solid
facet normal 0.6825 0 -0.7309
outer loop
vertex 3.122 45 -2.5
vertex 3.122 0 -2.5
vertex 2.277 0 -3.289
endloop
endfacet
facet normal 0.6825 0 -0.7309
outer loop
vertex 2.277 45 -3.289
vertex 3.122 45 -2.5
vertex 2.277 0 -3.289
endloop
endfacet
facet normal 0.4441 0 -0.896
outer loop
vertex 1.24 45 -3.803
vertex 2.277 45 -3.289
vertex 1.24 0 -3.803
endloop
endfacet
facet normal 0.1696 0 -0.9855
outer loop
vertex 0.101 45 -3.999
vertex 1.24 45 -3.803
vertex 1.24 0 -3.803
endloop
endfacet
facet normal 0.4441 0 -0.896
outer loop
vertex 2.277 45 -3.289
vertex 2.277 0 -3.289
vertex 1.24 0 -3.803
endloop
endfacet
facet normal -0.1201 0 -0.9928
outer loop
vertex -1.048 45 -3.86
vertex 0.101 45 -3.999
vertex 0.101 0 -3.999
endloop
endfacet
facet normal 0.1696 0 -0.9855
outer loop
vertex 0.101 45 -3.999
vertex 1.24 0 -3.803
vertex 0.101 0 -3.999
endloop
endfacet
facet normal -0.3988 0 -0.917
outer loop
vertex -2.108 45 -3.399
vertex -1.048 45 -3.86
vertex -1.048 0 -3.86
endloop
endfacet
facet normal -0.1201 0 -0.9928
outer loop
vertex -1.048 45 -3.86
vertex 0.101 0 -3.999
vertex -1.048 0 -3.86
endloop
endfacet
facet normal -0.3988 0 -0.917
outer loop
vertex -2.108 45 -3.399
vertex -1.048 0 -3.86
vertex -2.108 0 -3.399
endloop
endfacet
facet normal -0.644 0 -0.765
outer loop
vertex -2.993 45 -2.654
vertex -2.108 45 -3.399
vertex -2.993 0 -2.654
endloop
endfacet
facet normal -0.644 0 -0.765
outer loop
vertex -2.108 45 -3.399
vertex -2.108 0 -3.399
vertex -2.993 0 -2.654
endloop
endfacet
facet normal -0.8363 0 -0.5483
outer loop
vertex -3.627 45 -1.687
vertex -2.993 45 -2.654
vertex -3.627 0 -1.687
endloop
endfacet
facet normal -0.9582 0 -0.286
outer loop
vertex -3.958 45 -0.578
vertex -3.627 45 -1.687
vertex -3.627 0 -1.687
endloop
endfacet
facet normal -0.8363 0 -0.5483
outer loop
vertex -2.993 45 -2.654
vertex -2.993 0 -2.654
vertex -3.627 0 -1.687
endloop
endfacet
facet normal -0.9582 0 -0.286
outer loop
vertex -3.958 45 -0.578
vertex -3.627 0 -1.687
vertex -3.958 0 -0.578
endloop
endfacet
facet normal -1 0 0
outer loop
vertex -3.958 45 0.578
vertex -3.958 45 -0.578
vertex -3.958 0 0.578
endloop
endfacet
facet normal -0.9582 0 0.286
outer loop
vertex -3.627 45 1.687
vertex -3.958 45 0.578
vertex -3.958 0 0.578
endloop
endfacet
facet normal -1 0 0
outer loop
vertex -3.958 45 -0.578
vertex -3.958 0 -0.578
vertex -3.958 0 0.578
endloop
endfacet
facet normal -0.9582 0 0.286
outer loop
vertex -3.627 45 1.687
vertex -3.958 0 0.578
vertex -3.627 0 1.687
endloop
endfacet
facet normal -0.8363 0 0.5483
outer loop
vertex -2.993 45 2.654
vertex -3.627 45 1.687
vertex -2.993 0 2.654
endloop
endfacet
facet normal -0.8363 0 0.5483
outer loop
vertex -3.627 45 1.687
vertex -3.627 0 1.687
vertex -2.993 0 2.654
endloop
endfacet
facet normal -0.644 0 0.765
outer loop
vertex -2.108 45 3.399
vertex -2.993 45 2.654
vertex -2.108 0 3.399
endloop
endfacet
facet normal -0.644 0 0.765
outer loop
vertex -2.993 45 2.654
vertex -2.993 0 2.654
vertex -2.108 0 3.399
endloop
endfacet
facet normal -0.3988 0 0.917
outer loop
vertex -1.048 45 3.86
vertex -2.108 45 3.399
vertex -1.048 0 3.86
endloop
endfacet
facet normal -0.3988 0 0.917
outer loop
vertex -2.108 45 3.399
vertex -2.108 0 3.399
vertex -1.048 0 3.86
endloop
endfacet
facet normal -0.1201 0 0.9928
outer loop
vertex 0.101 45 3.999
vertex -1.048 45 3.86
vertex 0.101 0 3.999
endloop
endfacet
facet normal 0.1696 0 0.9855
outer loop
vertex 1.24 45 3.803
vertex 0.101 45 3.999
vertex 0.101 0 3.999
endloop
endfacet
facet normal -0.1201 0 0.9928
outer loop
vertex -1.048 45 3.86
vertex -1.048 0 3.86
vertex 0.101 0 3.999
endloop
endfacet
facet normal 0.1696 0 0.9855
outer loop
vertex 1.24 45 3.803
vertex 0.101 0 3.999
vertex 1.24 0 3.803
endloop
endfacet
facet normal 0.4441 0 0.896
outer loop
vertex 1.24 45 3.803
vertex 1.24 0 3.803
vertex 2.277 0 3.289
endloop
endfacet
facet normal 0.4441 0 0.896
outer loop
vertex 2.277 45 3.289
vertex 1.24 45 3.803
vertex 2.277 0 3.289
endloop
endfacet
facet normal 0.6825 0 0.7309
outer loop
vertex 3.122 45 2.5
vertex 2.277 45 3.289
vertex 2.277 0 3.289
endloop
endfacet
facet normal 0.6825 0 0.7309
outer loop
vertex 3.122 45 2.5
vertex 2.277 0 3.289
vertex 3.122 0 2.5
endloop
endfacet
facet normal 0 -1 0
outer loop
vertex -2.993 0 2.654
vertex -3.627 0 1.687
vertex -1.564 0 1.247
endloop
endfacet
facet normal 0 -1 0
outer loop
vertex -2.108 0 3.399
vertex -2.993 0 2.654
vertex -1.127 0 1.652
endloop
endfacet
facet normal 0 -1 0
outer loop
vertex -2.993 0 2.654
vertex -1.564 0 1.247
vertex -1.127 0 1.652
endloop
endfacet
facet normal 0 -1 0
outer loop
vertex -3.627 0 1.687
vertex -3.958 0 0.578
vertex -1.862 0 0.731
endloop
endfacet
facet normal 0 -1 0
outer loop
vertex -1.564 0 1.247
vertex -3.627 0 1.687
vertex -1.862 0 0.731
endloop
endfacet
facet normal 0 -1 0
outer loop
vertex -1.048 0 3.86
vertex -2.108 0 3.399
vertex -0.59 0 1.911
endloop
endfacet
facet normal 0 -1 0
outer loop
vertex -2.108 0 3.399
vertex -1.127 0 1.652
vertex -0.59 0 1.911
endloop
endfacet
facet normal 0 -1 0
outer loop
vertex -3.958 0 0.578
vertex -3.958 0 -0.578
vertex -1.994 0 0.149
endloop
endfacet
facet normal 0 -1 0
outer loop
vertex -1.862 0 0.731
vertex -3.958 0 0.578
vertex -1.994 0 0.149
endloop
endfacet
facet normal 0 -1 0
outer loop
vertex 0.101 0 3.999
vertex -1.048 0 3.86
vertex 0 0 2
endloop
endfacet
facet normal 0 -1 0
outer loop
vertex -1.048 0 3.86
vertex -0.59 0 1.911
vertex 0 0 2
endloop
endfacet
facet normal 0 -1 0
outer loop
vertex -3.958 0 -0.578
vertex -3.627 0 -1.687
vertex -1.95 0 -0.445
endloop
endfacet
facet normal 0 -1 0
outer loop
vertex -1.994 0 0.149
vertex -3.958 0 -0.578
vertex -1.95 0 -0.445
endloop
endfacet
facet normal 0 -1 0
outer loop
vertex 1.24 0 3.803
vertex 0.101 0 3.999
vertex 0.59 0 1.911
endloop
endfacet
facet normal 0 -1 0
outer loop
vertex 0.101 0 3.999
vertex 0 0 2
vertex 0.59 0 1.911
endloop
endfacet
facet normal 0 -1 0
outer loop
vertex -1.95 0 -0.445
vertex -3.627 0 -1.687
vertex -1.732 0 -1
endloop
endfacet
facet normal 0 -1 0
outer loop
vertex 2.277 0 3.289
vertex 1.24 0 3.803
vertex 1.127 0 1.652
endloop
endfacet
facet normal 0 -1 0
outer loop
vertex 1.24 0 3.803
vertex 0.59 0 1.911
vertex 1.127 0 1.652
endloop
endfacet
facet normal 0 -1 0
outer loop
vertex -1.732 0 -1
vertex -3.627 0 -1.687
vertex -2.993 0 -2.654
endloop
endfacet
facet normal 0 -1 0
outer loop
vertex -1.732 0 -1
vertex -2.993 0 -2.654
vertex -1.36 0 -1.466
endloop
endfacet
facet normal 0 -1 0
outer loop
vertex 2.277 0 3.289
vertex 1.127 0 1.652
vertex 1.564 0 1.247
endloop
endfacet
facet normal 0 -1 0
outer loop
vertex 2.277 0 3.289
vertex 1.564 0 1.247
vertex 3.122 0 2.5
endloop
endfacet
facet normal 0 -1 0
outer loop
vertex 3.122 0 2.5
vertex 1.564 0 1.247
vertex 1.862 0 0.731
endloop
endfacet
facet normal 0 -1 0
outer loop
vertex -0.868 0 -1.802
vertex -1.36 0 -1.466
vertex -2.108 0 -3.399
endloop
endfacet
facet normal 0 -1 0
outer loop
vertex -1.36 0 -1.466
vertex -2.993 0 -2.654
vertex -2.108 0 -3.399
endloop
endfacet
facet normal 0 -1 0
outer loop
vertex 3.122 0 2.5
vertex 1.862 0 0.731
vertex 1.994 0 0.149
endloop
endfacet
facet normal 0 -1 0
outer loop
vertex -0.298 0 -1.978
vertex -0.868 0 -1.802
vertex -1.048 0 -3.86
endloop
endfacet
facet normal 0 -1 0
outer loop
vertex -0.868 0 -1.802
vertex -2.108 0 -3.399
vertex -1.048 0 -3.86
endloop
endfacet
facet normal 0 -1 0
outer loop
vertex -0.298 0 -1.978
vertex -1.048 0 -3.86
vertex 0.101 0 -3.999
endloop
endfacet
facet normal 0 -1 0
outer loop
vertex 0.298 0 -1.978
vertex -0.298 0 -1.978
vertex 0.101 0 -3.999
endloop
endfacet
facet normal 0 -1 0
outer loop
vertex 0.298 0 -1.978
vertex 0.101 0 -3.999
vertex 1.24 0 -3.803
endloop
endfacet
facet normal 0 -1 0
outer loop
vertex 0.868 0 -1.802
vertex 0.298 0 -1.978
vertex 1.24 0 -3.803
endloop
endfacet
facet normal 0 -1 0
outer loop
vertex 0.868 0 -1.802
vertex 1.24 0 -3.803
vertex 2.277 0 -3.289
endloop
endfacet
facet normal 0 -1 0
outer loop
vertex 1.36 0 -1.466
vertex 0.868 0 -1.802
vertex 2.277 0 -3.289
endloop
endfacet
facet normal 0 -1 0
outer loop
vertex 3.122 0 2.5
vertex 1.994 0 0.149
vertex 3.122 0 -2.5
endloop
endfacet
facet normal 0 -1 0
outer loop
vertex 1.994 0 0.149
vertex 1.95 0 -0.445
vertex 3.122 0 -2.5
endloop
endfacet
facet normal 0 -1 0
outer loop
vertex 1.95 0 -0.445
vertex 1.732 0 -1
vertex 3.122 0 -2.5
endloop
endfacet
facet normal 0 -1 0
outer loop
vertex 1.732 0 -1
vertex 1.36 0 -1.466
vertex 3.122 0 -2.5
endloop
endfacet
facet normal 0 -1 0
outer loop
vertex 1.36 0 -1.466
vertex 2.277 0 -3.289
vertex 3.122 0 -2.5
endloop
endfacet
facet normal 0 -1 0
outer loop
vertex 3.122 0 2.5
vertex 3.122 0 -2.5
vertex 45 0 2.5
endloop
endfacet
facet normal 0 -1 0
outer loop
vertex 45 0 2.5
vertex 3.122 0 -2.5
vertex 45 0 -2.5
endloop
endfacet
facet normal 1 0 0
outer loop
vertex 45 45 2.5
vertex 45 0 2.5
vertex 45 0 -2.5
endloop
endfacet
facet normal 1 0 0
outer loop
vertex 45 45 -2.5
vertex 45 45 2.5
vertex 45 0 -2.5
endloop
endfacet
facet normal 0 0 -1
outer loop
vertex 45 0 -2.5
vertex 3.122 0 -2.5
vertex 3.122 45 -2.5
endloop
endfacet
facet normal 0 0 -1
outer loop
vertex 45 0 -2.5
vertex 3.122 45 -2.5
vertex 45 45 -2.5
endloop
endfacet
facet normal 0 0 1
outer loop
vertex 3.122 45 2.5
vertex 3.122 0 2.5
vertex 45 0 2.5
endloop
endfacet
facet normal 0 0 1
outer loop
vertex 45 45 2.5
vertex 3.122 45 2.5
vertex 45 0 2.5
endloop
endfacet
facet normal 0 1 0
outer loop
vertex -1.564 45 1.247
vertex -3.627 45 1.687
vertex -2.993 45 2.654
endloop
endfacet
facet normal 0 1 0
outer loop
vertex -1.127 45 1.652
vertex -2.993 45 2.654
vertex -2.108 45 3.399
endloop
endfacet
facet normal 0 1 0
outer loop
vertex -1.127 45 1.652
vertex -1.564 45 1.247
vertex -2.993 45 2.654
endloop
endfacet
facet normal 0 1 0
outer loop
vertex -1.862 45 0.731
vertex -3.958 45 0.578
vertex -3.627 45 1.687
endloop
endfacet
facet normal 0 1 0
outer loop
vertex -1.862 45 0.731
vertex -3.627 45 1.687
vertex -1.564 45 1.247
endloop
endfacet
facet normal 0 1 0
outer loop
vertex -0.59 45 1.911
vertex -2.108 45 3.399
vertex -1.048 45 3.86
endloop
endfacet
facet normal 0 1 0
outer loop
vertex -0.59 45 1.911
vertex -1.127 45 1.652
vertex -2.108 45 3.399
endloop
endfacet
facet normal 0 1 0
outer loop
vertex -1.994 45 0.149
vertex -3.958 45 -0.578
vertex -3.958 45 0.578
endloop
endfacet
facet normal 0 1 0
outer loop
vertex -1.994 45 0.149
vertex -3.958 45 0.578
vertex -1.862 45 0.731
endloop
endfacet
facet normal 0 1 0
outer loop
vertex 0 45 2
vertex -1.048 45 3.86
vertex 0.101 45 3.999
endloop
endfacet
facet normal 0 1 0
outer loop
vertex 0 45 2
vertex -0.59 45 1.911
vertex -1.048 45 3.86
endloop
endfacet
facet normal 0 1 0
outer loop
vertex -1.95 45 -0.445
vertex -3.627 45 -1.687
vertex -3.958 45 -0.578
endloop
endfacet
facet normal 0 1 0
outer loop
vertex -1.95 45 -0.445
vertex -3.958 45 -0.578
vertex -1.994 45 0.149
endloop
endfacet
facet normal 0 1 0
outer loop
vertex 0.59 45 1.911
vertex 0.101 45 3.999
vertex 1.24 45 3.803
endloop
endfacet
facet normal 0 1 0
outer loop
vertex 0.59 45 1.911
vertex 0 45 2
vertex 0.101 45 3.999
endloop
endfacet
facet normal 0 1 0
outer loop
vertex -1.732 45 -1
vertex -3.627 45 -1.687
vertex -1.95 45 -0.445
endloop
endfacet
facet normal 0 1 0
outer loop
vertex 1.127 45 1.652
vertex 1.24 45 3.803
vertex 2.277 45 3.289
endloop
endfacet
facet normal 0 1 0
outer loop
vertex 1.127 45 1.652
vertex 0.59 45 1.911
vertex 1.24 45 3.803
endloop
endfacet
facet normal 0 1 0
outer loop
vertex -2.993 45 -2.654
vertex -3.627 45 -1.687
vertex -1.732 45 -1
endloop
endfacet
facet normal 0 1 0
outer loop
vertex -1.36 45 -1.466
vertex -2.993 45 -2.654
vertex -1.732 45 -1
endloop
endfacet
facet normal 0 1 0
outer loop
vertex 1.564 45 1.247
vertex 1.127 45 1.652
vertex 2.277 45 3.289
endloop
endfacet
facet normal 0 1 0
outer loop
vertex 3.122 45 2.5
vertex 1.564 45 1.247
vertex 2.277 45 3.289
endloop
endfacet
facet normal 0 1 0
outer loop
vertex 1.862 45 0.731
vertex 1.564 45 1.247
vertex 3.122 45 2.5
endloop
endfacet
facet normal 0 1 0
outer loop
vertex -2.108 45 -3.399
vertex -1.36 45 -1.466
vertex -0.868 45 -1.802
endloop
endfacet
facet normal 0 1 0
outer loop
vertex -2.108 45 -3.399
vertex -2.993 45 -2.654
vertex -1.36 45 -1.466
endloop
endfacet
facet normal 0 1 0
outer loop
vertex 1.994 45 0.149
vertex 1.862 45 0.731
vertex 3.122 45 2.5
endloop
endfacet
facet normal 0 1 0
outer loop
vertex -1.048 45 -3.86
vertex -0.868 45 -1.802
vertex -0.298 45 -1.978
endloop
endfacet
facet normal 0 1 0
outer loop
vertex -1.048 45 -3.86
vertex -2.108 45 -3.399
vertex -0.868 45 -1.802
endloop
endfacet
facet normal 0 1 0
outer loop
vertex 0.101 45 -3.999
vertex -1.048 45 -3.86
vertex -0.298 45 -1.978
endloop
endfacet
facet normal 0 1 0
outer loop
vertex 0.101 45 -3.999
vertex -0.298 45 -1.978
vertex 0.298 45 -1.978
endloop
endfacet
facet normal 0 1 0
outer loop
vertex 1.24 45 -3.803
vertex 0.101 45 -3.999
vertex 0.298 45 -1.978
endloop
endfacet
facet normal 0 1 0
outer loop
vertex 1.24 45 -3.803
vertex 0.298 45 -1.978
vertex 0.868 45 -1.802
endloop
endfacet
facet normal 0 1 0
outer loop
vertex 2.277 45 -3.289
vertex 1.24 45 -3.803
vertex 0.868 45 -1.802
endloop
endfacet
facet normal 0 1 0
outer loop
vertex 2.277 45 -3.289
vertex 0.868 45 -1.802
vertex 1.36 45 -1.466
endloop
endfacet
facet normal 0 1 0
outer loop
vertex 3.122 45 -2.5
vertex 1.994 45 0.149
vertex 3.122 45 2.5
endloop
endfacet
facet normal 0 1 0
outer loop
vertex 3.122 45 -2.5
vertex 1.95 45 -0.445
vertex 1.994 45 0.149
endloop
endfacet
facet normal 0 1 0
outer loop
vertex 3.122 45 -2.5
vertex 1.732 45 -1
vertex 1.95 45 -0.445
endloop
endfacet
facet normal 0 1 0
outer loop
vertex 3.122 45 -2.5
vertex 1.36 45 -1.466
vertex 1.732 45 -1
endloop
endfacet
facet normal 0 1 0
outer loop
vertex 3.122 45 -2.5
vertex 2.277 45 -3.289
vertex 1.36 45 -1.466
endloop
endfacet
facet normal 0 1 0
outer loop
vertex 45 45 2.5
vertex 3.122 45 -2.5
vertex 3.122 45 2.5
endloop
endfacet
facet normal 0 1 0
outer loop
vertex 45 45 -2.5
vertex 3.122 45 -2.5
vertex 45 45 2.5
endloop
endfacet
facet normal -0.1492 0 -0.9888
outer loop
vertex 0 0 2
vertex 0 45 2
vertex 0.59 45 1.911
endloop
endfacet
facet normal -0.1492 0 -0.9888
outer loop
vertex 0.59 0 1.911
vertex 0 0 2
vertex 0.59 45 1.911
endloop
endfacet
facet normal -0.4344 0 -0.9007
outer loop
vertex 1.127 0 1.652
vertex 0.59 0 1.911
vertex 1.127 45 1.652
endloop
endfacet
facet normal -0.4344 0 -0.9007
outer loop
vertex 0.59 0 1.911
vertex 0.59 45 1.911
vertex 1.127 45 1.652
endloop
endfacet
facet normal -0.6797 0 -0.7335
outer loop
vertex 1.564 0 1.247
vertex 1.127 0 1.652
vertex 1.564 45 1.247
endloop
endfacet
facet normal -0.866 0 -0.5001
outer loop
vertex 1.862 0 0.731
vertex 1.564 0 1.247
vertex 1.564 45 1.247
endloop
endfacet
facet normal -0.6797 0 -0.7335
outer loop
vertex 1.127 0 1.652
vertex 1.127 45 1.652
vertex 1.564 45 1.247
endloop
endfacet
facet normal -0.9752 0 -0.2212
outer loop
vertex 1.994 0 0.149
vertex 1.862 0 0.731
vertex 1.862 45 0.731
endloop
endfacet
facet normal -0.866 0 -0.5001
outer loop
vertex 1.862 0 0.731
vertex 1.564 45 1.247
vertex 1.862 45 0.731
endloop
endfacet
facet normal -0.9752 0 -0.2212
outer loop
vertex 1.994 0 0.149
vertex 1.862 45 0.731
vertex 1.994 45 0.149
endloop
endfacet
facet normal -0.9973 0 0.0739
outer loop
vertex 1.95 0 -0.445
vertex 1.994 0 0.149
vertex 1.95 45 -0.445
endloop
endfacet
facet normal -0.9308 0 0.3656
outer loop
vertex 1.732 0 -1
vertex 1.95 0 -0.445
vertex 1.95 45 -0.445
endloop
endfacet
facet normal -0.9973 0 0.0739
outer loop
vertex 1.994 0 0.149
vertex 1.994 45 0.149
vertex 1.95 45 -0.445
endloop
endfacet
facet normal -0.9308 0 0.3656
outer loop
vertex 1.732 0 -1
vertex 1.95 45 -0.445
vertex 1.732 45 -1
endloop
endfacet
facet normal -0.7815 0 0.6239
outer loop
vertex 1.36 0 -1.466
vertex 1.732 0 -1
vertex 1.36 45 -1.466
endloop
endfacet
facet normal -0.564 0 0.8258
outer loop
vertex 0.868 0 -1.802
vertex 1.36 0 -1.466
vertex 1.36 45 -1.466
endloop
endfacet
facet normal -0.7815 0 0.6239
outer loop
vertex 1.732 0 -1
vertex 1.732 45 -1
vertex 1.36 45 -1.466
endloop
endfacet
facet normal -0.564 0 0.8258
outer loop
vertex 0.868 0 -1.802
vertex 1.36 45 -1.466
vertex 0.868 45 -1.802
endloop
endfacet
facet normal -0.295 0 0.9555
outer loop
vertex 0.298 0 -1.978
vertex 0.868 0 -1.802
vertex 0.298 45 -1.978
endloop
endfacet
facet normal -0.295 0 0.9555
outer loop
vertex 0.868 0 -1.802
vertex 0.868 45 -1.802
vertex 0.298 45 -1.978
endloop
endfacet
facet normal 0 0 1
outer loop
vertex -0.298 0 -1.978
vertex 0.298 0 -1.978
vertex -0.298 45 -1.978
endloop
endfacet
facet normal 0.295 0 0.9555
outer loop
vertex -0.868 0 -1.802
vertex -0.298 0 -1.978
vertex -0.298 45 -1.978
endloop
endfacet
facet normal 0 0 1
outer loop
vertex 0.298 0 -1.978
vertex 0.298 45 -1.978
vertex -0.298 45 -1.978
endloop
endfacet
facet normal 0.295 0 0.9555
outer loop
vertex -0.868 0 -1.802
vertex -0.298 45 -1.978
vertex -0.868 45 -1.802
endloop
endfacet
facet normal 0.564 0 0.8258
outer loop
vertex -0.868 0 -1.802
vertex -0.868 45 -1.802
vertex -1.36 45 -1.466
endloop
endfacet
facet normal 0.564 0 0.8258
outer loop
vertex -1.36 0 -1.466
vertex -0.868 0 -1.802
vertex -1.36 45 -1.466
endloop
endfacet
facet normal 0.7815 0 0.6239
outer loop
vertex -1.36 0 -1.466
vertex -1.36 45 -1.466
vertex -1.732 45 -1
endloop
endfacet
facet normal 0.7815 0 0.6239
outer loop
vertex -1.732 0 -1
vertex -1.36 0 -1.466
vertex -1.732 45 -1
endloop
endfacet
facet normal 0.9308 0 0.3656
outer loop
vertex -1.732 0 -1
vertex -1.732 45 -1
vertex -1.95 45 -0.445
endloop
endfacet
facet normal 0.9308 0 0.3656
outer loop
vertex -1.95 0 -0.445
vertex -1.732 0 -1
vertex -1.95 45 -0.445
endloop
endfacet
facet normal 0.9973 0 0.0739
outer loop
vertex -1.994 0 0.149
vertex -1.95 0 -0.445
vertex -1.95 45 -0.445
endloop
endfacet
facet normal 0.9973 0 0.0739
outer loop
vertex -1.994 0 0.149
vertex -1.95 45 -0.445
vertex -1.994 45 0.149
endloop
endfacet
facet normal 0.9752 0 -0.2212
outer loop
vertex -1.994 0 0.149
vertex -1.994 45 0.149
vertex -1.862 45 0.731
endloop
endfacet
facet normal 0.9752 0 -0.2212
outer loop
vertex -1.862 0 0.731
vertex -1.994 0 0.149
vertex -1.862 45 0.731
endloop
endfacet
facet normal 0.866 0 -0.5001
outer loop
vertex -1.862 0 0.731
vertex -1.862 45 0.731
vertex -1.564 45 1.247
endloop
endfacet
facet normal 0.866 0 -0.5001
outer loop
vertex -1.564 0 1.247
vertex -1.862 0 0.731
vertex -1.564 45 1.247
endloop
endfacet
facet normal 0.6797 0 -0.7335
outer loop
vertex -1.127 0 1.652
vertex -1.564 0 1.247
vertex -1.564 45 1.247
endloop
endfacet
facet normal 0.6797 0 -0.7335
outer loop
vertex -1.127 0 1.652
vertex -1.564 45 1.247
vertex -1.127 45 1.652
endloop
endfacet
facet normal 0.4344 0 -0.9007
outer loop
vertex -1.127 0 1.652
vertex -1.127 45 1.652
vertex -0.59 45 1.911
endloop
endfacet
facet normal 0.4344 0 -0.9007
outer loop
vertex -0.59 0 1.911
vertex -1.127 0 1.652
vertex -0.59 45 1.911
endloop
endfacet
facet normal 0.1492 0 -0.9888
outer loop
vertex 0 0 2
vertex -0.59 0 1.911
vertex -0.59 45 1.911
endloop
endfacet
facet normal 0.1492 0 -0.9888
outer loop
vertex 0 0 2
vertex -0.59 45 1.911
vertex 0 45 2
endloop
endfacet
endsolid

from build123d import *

# Parameters (mm, degrees)
SKETCH2_R           = 4
SKETCH2_W           = 45
SKETCH2_H           = 5
BOSS_EXTRUDE1_DEPTH = 45
SKETCH3_R           = 2
CUT_EXTRUDE1_DEPTH  = 64.765194268


with BuildPart() as part:
    # Sketch2 → Boss-Extrude1 (new body)
    with BuildSketch(Plane(origin=(0, 0, 0), x_dir=(1, 0, 0), z_dir=(0, 1, 0))):
        Circle(SKETCH2_R)
        with Locations((22.5, 0)):
            Rectangle(SKETCH2_W, SKETCH2_H)
    extrude(amount=BOSS_EXTRUDE1_DEPTH)

    # Sketch3 → Cut-Extrude1 (cut, through all)
    with BuildSketch(Plane(origin=(0, 45, 0), x_dir=(1, 0, 0), z_dir=(0, 1, 0))):
        with Locations(Location((0, 0, 0), (0, 0, 270))):
            Circle(SKETCH3_R)
    extrude(amount=-CUT_EXTRUDE1_DEPTH, mode=Mode.SUBTRACT)


solid = part.part
